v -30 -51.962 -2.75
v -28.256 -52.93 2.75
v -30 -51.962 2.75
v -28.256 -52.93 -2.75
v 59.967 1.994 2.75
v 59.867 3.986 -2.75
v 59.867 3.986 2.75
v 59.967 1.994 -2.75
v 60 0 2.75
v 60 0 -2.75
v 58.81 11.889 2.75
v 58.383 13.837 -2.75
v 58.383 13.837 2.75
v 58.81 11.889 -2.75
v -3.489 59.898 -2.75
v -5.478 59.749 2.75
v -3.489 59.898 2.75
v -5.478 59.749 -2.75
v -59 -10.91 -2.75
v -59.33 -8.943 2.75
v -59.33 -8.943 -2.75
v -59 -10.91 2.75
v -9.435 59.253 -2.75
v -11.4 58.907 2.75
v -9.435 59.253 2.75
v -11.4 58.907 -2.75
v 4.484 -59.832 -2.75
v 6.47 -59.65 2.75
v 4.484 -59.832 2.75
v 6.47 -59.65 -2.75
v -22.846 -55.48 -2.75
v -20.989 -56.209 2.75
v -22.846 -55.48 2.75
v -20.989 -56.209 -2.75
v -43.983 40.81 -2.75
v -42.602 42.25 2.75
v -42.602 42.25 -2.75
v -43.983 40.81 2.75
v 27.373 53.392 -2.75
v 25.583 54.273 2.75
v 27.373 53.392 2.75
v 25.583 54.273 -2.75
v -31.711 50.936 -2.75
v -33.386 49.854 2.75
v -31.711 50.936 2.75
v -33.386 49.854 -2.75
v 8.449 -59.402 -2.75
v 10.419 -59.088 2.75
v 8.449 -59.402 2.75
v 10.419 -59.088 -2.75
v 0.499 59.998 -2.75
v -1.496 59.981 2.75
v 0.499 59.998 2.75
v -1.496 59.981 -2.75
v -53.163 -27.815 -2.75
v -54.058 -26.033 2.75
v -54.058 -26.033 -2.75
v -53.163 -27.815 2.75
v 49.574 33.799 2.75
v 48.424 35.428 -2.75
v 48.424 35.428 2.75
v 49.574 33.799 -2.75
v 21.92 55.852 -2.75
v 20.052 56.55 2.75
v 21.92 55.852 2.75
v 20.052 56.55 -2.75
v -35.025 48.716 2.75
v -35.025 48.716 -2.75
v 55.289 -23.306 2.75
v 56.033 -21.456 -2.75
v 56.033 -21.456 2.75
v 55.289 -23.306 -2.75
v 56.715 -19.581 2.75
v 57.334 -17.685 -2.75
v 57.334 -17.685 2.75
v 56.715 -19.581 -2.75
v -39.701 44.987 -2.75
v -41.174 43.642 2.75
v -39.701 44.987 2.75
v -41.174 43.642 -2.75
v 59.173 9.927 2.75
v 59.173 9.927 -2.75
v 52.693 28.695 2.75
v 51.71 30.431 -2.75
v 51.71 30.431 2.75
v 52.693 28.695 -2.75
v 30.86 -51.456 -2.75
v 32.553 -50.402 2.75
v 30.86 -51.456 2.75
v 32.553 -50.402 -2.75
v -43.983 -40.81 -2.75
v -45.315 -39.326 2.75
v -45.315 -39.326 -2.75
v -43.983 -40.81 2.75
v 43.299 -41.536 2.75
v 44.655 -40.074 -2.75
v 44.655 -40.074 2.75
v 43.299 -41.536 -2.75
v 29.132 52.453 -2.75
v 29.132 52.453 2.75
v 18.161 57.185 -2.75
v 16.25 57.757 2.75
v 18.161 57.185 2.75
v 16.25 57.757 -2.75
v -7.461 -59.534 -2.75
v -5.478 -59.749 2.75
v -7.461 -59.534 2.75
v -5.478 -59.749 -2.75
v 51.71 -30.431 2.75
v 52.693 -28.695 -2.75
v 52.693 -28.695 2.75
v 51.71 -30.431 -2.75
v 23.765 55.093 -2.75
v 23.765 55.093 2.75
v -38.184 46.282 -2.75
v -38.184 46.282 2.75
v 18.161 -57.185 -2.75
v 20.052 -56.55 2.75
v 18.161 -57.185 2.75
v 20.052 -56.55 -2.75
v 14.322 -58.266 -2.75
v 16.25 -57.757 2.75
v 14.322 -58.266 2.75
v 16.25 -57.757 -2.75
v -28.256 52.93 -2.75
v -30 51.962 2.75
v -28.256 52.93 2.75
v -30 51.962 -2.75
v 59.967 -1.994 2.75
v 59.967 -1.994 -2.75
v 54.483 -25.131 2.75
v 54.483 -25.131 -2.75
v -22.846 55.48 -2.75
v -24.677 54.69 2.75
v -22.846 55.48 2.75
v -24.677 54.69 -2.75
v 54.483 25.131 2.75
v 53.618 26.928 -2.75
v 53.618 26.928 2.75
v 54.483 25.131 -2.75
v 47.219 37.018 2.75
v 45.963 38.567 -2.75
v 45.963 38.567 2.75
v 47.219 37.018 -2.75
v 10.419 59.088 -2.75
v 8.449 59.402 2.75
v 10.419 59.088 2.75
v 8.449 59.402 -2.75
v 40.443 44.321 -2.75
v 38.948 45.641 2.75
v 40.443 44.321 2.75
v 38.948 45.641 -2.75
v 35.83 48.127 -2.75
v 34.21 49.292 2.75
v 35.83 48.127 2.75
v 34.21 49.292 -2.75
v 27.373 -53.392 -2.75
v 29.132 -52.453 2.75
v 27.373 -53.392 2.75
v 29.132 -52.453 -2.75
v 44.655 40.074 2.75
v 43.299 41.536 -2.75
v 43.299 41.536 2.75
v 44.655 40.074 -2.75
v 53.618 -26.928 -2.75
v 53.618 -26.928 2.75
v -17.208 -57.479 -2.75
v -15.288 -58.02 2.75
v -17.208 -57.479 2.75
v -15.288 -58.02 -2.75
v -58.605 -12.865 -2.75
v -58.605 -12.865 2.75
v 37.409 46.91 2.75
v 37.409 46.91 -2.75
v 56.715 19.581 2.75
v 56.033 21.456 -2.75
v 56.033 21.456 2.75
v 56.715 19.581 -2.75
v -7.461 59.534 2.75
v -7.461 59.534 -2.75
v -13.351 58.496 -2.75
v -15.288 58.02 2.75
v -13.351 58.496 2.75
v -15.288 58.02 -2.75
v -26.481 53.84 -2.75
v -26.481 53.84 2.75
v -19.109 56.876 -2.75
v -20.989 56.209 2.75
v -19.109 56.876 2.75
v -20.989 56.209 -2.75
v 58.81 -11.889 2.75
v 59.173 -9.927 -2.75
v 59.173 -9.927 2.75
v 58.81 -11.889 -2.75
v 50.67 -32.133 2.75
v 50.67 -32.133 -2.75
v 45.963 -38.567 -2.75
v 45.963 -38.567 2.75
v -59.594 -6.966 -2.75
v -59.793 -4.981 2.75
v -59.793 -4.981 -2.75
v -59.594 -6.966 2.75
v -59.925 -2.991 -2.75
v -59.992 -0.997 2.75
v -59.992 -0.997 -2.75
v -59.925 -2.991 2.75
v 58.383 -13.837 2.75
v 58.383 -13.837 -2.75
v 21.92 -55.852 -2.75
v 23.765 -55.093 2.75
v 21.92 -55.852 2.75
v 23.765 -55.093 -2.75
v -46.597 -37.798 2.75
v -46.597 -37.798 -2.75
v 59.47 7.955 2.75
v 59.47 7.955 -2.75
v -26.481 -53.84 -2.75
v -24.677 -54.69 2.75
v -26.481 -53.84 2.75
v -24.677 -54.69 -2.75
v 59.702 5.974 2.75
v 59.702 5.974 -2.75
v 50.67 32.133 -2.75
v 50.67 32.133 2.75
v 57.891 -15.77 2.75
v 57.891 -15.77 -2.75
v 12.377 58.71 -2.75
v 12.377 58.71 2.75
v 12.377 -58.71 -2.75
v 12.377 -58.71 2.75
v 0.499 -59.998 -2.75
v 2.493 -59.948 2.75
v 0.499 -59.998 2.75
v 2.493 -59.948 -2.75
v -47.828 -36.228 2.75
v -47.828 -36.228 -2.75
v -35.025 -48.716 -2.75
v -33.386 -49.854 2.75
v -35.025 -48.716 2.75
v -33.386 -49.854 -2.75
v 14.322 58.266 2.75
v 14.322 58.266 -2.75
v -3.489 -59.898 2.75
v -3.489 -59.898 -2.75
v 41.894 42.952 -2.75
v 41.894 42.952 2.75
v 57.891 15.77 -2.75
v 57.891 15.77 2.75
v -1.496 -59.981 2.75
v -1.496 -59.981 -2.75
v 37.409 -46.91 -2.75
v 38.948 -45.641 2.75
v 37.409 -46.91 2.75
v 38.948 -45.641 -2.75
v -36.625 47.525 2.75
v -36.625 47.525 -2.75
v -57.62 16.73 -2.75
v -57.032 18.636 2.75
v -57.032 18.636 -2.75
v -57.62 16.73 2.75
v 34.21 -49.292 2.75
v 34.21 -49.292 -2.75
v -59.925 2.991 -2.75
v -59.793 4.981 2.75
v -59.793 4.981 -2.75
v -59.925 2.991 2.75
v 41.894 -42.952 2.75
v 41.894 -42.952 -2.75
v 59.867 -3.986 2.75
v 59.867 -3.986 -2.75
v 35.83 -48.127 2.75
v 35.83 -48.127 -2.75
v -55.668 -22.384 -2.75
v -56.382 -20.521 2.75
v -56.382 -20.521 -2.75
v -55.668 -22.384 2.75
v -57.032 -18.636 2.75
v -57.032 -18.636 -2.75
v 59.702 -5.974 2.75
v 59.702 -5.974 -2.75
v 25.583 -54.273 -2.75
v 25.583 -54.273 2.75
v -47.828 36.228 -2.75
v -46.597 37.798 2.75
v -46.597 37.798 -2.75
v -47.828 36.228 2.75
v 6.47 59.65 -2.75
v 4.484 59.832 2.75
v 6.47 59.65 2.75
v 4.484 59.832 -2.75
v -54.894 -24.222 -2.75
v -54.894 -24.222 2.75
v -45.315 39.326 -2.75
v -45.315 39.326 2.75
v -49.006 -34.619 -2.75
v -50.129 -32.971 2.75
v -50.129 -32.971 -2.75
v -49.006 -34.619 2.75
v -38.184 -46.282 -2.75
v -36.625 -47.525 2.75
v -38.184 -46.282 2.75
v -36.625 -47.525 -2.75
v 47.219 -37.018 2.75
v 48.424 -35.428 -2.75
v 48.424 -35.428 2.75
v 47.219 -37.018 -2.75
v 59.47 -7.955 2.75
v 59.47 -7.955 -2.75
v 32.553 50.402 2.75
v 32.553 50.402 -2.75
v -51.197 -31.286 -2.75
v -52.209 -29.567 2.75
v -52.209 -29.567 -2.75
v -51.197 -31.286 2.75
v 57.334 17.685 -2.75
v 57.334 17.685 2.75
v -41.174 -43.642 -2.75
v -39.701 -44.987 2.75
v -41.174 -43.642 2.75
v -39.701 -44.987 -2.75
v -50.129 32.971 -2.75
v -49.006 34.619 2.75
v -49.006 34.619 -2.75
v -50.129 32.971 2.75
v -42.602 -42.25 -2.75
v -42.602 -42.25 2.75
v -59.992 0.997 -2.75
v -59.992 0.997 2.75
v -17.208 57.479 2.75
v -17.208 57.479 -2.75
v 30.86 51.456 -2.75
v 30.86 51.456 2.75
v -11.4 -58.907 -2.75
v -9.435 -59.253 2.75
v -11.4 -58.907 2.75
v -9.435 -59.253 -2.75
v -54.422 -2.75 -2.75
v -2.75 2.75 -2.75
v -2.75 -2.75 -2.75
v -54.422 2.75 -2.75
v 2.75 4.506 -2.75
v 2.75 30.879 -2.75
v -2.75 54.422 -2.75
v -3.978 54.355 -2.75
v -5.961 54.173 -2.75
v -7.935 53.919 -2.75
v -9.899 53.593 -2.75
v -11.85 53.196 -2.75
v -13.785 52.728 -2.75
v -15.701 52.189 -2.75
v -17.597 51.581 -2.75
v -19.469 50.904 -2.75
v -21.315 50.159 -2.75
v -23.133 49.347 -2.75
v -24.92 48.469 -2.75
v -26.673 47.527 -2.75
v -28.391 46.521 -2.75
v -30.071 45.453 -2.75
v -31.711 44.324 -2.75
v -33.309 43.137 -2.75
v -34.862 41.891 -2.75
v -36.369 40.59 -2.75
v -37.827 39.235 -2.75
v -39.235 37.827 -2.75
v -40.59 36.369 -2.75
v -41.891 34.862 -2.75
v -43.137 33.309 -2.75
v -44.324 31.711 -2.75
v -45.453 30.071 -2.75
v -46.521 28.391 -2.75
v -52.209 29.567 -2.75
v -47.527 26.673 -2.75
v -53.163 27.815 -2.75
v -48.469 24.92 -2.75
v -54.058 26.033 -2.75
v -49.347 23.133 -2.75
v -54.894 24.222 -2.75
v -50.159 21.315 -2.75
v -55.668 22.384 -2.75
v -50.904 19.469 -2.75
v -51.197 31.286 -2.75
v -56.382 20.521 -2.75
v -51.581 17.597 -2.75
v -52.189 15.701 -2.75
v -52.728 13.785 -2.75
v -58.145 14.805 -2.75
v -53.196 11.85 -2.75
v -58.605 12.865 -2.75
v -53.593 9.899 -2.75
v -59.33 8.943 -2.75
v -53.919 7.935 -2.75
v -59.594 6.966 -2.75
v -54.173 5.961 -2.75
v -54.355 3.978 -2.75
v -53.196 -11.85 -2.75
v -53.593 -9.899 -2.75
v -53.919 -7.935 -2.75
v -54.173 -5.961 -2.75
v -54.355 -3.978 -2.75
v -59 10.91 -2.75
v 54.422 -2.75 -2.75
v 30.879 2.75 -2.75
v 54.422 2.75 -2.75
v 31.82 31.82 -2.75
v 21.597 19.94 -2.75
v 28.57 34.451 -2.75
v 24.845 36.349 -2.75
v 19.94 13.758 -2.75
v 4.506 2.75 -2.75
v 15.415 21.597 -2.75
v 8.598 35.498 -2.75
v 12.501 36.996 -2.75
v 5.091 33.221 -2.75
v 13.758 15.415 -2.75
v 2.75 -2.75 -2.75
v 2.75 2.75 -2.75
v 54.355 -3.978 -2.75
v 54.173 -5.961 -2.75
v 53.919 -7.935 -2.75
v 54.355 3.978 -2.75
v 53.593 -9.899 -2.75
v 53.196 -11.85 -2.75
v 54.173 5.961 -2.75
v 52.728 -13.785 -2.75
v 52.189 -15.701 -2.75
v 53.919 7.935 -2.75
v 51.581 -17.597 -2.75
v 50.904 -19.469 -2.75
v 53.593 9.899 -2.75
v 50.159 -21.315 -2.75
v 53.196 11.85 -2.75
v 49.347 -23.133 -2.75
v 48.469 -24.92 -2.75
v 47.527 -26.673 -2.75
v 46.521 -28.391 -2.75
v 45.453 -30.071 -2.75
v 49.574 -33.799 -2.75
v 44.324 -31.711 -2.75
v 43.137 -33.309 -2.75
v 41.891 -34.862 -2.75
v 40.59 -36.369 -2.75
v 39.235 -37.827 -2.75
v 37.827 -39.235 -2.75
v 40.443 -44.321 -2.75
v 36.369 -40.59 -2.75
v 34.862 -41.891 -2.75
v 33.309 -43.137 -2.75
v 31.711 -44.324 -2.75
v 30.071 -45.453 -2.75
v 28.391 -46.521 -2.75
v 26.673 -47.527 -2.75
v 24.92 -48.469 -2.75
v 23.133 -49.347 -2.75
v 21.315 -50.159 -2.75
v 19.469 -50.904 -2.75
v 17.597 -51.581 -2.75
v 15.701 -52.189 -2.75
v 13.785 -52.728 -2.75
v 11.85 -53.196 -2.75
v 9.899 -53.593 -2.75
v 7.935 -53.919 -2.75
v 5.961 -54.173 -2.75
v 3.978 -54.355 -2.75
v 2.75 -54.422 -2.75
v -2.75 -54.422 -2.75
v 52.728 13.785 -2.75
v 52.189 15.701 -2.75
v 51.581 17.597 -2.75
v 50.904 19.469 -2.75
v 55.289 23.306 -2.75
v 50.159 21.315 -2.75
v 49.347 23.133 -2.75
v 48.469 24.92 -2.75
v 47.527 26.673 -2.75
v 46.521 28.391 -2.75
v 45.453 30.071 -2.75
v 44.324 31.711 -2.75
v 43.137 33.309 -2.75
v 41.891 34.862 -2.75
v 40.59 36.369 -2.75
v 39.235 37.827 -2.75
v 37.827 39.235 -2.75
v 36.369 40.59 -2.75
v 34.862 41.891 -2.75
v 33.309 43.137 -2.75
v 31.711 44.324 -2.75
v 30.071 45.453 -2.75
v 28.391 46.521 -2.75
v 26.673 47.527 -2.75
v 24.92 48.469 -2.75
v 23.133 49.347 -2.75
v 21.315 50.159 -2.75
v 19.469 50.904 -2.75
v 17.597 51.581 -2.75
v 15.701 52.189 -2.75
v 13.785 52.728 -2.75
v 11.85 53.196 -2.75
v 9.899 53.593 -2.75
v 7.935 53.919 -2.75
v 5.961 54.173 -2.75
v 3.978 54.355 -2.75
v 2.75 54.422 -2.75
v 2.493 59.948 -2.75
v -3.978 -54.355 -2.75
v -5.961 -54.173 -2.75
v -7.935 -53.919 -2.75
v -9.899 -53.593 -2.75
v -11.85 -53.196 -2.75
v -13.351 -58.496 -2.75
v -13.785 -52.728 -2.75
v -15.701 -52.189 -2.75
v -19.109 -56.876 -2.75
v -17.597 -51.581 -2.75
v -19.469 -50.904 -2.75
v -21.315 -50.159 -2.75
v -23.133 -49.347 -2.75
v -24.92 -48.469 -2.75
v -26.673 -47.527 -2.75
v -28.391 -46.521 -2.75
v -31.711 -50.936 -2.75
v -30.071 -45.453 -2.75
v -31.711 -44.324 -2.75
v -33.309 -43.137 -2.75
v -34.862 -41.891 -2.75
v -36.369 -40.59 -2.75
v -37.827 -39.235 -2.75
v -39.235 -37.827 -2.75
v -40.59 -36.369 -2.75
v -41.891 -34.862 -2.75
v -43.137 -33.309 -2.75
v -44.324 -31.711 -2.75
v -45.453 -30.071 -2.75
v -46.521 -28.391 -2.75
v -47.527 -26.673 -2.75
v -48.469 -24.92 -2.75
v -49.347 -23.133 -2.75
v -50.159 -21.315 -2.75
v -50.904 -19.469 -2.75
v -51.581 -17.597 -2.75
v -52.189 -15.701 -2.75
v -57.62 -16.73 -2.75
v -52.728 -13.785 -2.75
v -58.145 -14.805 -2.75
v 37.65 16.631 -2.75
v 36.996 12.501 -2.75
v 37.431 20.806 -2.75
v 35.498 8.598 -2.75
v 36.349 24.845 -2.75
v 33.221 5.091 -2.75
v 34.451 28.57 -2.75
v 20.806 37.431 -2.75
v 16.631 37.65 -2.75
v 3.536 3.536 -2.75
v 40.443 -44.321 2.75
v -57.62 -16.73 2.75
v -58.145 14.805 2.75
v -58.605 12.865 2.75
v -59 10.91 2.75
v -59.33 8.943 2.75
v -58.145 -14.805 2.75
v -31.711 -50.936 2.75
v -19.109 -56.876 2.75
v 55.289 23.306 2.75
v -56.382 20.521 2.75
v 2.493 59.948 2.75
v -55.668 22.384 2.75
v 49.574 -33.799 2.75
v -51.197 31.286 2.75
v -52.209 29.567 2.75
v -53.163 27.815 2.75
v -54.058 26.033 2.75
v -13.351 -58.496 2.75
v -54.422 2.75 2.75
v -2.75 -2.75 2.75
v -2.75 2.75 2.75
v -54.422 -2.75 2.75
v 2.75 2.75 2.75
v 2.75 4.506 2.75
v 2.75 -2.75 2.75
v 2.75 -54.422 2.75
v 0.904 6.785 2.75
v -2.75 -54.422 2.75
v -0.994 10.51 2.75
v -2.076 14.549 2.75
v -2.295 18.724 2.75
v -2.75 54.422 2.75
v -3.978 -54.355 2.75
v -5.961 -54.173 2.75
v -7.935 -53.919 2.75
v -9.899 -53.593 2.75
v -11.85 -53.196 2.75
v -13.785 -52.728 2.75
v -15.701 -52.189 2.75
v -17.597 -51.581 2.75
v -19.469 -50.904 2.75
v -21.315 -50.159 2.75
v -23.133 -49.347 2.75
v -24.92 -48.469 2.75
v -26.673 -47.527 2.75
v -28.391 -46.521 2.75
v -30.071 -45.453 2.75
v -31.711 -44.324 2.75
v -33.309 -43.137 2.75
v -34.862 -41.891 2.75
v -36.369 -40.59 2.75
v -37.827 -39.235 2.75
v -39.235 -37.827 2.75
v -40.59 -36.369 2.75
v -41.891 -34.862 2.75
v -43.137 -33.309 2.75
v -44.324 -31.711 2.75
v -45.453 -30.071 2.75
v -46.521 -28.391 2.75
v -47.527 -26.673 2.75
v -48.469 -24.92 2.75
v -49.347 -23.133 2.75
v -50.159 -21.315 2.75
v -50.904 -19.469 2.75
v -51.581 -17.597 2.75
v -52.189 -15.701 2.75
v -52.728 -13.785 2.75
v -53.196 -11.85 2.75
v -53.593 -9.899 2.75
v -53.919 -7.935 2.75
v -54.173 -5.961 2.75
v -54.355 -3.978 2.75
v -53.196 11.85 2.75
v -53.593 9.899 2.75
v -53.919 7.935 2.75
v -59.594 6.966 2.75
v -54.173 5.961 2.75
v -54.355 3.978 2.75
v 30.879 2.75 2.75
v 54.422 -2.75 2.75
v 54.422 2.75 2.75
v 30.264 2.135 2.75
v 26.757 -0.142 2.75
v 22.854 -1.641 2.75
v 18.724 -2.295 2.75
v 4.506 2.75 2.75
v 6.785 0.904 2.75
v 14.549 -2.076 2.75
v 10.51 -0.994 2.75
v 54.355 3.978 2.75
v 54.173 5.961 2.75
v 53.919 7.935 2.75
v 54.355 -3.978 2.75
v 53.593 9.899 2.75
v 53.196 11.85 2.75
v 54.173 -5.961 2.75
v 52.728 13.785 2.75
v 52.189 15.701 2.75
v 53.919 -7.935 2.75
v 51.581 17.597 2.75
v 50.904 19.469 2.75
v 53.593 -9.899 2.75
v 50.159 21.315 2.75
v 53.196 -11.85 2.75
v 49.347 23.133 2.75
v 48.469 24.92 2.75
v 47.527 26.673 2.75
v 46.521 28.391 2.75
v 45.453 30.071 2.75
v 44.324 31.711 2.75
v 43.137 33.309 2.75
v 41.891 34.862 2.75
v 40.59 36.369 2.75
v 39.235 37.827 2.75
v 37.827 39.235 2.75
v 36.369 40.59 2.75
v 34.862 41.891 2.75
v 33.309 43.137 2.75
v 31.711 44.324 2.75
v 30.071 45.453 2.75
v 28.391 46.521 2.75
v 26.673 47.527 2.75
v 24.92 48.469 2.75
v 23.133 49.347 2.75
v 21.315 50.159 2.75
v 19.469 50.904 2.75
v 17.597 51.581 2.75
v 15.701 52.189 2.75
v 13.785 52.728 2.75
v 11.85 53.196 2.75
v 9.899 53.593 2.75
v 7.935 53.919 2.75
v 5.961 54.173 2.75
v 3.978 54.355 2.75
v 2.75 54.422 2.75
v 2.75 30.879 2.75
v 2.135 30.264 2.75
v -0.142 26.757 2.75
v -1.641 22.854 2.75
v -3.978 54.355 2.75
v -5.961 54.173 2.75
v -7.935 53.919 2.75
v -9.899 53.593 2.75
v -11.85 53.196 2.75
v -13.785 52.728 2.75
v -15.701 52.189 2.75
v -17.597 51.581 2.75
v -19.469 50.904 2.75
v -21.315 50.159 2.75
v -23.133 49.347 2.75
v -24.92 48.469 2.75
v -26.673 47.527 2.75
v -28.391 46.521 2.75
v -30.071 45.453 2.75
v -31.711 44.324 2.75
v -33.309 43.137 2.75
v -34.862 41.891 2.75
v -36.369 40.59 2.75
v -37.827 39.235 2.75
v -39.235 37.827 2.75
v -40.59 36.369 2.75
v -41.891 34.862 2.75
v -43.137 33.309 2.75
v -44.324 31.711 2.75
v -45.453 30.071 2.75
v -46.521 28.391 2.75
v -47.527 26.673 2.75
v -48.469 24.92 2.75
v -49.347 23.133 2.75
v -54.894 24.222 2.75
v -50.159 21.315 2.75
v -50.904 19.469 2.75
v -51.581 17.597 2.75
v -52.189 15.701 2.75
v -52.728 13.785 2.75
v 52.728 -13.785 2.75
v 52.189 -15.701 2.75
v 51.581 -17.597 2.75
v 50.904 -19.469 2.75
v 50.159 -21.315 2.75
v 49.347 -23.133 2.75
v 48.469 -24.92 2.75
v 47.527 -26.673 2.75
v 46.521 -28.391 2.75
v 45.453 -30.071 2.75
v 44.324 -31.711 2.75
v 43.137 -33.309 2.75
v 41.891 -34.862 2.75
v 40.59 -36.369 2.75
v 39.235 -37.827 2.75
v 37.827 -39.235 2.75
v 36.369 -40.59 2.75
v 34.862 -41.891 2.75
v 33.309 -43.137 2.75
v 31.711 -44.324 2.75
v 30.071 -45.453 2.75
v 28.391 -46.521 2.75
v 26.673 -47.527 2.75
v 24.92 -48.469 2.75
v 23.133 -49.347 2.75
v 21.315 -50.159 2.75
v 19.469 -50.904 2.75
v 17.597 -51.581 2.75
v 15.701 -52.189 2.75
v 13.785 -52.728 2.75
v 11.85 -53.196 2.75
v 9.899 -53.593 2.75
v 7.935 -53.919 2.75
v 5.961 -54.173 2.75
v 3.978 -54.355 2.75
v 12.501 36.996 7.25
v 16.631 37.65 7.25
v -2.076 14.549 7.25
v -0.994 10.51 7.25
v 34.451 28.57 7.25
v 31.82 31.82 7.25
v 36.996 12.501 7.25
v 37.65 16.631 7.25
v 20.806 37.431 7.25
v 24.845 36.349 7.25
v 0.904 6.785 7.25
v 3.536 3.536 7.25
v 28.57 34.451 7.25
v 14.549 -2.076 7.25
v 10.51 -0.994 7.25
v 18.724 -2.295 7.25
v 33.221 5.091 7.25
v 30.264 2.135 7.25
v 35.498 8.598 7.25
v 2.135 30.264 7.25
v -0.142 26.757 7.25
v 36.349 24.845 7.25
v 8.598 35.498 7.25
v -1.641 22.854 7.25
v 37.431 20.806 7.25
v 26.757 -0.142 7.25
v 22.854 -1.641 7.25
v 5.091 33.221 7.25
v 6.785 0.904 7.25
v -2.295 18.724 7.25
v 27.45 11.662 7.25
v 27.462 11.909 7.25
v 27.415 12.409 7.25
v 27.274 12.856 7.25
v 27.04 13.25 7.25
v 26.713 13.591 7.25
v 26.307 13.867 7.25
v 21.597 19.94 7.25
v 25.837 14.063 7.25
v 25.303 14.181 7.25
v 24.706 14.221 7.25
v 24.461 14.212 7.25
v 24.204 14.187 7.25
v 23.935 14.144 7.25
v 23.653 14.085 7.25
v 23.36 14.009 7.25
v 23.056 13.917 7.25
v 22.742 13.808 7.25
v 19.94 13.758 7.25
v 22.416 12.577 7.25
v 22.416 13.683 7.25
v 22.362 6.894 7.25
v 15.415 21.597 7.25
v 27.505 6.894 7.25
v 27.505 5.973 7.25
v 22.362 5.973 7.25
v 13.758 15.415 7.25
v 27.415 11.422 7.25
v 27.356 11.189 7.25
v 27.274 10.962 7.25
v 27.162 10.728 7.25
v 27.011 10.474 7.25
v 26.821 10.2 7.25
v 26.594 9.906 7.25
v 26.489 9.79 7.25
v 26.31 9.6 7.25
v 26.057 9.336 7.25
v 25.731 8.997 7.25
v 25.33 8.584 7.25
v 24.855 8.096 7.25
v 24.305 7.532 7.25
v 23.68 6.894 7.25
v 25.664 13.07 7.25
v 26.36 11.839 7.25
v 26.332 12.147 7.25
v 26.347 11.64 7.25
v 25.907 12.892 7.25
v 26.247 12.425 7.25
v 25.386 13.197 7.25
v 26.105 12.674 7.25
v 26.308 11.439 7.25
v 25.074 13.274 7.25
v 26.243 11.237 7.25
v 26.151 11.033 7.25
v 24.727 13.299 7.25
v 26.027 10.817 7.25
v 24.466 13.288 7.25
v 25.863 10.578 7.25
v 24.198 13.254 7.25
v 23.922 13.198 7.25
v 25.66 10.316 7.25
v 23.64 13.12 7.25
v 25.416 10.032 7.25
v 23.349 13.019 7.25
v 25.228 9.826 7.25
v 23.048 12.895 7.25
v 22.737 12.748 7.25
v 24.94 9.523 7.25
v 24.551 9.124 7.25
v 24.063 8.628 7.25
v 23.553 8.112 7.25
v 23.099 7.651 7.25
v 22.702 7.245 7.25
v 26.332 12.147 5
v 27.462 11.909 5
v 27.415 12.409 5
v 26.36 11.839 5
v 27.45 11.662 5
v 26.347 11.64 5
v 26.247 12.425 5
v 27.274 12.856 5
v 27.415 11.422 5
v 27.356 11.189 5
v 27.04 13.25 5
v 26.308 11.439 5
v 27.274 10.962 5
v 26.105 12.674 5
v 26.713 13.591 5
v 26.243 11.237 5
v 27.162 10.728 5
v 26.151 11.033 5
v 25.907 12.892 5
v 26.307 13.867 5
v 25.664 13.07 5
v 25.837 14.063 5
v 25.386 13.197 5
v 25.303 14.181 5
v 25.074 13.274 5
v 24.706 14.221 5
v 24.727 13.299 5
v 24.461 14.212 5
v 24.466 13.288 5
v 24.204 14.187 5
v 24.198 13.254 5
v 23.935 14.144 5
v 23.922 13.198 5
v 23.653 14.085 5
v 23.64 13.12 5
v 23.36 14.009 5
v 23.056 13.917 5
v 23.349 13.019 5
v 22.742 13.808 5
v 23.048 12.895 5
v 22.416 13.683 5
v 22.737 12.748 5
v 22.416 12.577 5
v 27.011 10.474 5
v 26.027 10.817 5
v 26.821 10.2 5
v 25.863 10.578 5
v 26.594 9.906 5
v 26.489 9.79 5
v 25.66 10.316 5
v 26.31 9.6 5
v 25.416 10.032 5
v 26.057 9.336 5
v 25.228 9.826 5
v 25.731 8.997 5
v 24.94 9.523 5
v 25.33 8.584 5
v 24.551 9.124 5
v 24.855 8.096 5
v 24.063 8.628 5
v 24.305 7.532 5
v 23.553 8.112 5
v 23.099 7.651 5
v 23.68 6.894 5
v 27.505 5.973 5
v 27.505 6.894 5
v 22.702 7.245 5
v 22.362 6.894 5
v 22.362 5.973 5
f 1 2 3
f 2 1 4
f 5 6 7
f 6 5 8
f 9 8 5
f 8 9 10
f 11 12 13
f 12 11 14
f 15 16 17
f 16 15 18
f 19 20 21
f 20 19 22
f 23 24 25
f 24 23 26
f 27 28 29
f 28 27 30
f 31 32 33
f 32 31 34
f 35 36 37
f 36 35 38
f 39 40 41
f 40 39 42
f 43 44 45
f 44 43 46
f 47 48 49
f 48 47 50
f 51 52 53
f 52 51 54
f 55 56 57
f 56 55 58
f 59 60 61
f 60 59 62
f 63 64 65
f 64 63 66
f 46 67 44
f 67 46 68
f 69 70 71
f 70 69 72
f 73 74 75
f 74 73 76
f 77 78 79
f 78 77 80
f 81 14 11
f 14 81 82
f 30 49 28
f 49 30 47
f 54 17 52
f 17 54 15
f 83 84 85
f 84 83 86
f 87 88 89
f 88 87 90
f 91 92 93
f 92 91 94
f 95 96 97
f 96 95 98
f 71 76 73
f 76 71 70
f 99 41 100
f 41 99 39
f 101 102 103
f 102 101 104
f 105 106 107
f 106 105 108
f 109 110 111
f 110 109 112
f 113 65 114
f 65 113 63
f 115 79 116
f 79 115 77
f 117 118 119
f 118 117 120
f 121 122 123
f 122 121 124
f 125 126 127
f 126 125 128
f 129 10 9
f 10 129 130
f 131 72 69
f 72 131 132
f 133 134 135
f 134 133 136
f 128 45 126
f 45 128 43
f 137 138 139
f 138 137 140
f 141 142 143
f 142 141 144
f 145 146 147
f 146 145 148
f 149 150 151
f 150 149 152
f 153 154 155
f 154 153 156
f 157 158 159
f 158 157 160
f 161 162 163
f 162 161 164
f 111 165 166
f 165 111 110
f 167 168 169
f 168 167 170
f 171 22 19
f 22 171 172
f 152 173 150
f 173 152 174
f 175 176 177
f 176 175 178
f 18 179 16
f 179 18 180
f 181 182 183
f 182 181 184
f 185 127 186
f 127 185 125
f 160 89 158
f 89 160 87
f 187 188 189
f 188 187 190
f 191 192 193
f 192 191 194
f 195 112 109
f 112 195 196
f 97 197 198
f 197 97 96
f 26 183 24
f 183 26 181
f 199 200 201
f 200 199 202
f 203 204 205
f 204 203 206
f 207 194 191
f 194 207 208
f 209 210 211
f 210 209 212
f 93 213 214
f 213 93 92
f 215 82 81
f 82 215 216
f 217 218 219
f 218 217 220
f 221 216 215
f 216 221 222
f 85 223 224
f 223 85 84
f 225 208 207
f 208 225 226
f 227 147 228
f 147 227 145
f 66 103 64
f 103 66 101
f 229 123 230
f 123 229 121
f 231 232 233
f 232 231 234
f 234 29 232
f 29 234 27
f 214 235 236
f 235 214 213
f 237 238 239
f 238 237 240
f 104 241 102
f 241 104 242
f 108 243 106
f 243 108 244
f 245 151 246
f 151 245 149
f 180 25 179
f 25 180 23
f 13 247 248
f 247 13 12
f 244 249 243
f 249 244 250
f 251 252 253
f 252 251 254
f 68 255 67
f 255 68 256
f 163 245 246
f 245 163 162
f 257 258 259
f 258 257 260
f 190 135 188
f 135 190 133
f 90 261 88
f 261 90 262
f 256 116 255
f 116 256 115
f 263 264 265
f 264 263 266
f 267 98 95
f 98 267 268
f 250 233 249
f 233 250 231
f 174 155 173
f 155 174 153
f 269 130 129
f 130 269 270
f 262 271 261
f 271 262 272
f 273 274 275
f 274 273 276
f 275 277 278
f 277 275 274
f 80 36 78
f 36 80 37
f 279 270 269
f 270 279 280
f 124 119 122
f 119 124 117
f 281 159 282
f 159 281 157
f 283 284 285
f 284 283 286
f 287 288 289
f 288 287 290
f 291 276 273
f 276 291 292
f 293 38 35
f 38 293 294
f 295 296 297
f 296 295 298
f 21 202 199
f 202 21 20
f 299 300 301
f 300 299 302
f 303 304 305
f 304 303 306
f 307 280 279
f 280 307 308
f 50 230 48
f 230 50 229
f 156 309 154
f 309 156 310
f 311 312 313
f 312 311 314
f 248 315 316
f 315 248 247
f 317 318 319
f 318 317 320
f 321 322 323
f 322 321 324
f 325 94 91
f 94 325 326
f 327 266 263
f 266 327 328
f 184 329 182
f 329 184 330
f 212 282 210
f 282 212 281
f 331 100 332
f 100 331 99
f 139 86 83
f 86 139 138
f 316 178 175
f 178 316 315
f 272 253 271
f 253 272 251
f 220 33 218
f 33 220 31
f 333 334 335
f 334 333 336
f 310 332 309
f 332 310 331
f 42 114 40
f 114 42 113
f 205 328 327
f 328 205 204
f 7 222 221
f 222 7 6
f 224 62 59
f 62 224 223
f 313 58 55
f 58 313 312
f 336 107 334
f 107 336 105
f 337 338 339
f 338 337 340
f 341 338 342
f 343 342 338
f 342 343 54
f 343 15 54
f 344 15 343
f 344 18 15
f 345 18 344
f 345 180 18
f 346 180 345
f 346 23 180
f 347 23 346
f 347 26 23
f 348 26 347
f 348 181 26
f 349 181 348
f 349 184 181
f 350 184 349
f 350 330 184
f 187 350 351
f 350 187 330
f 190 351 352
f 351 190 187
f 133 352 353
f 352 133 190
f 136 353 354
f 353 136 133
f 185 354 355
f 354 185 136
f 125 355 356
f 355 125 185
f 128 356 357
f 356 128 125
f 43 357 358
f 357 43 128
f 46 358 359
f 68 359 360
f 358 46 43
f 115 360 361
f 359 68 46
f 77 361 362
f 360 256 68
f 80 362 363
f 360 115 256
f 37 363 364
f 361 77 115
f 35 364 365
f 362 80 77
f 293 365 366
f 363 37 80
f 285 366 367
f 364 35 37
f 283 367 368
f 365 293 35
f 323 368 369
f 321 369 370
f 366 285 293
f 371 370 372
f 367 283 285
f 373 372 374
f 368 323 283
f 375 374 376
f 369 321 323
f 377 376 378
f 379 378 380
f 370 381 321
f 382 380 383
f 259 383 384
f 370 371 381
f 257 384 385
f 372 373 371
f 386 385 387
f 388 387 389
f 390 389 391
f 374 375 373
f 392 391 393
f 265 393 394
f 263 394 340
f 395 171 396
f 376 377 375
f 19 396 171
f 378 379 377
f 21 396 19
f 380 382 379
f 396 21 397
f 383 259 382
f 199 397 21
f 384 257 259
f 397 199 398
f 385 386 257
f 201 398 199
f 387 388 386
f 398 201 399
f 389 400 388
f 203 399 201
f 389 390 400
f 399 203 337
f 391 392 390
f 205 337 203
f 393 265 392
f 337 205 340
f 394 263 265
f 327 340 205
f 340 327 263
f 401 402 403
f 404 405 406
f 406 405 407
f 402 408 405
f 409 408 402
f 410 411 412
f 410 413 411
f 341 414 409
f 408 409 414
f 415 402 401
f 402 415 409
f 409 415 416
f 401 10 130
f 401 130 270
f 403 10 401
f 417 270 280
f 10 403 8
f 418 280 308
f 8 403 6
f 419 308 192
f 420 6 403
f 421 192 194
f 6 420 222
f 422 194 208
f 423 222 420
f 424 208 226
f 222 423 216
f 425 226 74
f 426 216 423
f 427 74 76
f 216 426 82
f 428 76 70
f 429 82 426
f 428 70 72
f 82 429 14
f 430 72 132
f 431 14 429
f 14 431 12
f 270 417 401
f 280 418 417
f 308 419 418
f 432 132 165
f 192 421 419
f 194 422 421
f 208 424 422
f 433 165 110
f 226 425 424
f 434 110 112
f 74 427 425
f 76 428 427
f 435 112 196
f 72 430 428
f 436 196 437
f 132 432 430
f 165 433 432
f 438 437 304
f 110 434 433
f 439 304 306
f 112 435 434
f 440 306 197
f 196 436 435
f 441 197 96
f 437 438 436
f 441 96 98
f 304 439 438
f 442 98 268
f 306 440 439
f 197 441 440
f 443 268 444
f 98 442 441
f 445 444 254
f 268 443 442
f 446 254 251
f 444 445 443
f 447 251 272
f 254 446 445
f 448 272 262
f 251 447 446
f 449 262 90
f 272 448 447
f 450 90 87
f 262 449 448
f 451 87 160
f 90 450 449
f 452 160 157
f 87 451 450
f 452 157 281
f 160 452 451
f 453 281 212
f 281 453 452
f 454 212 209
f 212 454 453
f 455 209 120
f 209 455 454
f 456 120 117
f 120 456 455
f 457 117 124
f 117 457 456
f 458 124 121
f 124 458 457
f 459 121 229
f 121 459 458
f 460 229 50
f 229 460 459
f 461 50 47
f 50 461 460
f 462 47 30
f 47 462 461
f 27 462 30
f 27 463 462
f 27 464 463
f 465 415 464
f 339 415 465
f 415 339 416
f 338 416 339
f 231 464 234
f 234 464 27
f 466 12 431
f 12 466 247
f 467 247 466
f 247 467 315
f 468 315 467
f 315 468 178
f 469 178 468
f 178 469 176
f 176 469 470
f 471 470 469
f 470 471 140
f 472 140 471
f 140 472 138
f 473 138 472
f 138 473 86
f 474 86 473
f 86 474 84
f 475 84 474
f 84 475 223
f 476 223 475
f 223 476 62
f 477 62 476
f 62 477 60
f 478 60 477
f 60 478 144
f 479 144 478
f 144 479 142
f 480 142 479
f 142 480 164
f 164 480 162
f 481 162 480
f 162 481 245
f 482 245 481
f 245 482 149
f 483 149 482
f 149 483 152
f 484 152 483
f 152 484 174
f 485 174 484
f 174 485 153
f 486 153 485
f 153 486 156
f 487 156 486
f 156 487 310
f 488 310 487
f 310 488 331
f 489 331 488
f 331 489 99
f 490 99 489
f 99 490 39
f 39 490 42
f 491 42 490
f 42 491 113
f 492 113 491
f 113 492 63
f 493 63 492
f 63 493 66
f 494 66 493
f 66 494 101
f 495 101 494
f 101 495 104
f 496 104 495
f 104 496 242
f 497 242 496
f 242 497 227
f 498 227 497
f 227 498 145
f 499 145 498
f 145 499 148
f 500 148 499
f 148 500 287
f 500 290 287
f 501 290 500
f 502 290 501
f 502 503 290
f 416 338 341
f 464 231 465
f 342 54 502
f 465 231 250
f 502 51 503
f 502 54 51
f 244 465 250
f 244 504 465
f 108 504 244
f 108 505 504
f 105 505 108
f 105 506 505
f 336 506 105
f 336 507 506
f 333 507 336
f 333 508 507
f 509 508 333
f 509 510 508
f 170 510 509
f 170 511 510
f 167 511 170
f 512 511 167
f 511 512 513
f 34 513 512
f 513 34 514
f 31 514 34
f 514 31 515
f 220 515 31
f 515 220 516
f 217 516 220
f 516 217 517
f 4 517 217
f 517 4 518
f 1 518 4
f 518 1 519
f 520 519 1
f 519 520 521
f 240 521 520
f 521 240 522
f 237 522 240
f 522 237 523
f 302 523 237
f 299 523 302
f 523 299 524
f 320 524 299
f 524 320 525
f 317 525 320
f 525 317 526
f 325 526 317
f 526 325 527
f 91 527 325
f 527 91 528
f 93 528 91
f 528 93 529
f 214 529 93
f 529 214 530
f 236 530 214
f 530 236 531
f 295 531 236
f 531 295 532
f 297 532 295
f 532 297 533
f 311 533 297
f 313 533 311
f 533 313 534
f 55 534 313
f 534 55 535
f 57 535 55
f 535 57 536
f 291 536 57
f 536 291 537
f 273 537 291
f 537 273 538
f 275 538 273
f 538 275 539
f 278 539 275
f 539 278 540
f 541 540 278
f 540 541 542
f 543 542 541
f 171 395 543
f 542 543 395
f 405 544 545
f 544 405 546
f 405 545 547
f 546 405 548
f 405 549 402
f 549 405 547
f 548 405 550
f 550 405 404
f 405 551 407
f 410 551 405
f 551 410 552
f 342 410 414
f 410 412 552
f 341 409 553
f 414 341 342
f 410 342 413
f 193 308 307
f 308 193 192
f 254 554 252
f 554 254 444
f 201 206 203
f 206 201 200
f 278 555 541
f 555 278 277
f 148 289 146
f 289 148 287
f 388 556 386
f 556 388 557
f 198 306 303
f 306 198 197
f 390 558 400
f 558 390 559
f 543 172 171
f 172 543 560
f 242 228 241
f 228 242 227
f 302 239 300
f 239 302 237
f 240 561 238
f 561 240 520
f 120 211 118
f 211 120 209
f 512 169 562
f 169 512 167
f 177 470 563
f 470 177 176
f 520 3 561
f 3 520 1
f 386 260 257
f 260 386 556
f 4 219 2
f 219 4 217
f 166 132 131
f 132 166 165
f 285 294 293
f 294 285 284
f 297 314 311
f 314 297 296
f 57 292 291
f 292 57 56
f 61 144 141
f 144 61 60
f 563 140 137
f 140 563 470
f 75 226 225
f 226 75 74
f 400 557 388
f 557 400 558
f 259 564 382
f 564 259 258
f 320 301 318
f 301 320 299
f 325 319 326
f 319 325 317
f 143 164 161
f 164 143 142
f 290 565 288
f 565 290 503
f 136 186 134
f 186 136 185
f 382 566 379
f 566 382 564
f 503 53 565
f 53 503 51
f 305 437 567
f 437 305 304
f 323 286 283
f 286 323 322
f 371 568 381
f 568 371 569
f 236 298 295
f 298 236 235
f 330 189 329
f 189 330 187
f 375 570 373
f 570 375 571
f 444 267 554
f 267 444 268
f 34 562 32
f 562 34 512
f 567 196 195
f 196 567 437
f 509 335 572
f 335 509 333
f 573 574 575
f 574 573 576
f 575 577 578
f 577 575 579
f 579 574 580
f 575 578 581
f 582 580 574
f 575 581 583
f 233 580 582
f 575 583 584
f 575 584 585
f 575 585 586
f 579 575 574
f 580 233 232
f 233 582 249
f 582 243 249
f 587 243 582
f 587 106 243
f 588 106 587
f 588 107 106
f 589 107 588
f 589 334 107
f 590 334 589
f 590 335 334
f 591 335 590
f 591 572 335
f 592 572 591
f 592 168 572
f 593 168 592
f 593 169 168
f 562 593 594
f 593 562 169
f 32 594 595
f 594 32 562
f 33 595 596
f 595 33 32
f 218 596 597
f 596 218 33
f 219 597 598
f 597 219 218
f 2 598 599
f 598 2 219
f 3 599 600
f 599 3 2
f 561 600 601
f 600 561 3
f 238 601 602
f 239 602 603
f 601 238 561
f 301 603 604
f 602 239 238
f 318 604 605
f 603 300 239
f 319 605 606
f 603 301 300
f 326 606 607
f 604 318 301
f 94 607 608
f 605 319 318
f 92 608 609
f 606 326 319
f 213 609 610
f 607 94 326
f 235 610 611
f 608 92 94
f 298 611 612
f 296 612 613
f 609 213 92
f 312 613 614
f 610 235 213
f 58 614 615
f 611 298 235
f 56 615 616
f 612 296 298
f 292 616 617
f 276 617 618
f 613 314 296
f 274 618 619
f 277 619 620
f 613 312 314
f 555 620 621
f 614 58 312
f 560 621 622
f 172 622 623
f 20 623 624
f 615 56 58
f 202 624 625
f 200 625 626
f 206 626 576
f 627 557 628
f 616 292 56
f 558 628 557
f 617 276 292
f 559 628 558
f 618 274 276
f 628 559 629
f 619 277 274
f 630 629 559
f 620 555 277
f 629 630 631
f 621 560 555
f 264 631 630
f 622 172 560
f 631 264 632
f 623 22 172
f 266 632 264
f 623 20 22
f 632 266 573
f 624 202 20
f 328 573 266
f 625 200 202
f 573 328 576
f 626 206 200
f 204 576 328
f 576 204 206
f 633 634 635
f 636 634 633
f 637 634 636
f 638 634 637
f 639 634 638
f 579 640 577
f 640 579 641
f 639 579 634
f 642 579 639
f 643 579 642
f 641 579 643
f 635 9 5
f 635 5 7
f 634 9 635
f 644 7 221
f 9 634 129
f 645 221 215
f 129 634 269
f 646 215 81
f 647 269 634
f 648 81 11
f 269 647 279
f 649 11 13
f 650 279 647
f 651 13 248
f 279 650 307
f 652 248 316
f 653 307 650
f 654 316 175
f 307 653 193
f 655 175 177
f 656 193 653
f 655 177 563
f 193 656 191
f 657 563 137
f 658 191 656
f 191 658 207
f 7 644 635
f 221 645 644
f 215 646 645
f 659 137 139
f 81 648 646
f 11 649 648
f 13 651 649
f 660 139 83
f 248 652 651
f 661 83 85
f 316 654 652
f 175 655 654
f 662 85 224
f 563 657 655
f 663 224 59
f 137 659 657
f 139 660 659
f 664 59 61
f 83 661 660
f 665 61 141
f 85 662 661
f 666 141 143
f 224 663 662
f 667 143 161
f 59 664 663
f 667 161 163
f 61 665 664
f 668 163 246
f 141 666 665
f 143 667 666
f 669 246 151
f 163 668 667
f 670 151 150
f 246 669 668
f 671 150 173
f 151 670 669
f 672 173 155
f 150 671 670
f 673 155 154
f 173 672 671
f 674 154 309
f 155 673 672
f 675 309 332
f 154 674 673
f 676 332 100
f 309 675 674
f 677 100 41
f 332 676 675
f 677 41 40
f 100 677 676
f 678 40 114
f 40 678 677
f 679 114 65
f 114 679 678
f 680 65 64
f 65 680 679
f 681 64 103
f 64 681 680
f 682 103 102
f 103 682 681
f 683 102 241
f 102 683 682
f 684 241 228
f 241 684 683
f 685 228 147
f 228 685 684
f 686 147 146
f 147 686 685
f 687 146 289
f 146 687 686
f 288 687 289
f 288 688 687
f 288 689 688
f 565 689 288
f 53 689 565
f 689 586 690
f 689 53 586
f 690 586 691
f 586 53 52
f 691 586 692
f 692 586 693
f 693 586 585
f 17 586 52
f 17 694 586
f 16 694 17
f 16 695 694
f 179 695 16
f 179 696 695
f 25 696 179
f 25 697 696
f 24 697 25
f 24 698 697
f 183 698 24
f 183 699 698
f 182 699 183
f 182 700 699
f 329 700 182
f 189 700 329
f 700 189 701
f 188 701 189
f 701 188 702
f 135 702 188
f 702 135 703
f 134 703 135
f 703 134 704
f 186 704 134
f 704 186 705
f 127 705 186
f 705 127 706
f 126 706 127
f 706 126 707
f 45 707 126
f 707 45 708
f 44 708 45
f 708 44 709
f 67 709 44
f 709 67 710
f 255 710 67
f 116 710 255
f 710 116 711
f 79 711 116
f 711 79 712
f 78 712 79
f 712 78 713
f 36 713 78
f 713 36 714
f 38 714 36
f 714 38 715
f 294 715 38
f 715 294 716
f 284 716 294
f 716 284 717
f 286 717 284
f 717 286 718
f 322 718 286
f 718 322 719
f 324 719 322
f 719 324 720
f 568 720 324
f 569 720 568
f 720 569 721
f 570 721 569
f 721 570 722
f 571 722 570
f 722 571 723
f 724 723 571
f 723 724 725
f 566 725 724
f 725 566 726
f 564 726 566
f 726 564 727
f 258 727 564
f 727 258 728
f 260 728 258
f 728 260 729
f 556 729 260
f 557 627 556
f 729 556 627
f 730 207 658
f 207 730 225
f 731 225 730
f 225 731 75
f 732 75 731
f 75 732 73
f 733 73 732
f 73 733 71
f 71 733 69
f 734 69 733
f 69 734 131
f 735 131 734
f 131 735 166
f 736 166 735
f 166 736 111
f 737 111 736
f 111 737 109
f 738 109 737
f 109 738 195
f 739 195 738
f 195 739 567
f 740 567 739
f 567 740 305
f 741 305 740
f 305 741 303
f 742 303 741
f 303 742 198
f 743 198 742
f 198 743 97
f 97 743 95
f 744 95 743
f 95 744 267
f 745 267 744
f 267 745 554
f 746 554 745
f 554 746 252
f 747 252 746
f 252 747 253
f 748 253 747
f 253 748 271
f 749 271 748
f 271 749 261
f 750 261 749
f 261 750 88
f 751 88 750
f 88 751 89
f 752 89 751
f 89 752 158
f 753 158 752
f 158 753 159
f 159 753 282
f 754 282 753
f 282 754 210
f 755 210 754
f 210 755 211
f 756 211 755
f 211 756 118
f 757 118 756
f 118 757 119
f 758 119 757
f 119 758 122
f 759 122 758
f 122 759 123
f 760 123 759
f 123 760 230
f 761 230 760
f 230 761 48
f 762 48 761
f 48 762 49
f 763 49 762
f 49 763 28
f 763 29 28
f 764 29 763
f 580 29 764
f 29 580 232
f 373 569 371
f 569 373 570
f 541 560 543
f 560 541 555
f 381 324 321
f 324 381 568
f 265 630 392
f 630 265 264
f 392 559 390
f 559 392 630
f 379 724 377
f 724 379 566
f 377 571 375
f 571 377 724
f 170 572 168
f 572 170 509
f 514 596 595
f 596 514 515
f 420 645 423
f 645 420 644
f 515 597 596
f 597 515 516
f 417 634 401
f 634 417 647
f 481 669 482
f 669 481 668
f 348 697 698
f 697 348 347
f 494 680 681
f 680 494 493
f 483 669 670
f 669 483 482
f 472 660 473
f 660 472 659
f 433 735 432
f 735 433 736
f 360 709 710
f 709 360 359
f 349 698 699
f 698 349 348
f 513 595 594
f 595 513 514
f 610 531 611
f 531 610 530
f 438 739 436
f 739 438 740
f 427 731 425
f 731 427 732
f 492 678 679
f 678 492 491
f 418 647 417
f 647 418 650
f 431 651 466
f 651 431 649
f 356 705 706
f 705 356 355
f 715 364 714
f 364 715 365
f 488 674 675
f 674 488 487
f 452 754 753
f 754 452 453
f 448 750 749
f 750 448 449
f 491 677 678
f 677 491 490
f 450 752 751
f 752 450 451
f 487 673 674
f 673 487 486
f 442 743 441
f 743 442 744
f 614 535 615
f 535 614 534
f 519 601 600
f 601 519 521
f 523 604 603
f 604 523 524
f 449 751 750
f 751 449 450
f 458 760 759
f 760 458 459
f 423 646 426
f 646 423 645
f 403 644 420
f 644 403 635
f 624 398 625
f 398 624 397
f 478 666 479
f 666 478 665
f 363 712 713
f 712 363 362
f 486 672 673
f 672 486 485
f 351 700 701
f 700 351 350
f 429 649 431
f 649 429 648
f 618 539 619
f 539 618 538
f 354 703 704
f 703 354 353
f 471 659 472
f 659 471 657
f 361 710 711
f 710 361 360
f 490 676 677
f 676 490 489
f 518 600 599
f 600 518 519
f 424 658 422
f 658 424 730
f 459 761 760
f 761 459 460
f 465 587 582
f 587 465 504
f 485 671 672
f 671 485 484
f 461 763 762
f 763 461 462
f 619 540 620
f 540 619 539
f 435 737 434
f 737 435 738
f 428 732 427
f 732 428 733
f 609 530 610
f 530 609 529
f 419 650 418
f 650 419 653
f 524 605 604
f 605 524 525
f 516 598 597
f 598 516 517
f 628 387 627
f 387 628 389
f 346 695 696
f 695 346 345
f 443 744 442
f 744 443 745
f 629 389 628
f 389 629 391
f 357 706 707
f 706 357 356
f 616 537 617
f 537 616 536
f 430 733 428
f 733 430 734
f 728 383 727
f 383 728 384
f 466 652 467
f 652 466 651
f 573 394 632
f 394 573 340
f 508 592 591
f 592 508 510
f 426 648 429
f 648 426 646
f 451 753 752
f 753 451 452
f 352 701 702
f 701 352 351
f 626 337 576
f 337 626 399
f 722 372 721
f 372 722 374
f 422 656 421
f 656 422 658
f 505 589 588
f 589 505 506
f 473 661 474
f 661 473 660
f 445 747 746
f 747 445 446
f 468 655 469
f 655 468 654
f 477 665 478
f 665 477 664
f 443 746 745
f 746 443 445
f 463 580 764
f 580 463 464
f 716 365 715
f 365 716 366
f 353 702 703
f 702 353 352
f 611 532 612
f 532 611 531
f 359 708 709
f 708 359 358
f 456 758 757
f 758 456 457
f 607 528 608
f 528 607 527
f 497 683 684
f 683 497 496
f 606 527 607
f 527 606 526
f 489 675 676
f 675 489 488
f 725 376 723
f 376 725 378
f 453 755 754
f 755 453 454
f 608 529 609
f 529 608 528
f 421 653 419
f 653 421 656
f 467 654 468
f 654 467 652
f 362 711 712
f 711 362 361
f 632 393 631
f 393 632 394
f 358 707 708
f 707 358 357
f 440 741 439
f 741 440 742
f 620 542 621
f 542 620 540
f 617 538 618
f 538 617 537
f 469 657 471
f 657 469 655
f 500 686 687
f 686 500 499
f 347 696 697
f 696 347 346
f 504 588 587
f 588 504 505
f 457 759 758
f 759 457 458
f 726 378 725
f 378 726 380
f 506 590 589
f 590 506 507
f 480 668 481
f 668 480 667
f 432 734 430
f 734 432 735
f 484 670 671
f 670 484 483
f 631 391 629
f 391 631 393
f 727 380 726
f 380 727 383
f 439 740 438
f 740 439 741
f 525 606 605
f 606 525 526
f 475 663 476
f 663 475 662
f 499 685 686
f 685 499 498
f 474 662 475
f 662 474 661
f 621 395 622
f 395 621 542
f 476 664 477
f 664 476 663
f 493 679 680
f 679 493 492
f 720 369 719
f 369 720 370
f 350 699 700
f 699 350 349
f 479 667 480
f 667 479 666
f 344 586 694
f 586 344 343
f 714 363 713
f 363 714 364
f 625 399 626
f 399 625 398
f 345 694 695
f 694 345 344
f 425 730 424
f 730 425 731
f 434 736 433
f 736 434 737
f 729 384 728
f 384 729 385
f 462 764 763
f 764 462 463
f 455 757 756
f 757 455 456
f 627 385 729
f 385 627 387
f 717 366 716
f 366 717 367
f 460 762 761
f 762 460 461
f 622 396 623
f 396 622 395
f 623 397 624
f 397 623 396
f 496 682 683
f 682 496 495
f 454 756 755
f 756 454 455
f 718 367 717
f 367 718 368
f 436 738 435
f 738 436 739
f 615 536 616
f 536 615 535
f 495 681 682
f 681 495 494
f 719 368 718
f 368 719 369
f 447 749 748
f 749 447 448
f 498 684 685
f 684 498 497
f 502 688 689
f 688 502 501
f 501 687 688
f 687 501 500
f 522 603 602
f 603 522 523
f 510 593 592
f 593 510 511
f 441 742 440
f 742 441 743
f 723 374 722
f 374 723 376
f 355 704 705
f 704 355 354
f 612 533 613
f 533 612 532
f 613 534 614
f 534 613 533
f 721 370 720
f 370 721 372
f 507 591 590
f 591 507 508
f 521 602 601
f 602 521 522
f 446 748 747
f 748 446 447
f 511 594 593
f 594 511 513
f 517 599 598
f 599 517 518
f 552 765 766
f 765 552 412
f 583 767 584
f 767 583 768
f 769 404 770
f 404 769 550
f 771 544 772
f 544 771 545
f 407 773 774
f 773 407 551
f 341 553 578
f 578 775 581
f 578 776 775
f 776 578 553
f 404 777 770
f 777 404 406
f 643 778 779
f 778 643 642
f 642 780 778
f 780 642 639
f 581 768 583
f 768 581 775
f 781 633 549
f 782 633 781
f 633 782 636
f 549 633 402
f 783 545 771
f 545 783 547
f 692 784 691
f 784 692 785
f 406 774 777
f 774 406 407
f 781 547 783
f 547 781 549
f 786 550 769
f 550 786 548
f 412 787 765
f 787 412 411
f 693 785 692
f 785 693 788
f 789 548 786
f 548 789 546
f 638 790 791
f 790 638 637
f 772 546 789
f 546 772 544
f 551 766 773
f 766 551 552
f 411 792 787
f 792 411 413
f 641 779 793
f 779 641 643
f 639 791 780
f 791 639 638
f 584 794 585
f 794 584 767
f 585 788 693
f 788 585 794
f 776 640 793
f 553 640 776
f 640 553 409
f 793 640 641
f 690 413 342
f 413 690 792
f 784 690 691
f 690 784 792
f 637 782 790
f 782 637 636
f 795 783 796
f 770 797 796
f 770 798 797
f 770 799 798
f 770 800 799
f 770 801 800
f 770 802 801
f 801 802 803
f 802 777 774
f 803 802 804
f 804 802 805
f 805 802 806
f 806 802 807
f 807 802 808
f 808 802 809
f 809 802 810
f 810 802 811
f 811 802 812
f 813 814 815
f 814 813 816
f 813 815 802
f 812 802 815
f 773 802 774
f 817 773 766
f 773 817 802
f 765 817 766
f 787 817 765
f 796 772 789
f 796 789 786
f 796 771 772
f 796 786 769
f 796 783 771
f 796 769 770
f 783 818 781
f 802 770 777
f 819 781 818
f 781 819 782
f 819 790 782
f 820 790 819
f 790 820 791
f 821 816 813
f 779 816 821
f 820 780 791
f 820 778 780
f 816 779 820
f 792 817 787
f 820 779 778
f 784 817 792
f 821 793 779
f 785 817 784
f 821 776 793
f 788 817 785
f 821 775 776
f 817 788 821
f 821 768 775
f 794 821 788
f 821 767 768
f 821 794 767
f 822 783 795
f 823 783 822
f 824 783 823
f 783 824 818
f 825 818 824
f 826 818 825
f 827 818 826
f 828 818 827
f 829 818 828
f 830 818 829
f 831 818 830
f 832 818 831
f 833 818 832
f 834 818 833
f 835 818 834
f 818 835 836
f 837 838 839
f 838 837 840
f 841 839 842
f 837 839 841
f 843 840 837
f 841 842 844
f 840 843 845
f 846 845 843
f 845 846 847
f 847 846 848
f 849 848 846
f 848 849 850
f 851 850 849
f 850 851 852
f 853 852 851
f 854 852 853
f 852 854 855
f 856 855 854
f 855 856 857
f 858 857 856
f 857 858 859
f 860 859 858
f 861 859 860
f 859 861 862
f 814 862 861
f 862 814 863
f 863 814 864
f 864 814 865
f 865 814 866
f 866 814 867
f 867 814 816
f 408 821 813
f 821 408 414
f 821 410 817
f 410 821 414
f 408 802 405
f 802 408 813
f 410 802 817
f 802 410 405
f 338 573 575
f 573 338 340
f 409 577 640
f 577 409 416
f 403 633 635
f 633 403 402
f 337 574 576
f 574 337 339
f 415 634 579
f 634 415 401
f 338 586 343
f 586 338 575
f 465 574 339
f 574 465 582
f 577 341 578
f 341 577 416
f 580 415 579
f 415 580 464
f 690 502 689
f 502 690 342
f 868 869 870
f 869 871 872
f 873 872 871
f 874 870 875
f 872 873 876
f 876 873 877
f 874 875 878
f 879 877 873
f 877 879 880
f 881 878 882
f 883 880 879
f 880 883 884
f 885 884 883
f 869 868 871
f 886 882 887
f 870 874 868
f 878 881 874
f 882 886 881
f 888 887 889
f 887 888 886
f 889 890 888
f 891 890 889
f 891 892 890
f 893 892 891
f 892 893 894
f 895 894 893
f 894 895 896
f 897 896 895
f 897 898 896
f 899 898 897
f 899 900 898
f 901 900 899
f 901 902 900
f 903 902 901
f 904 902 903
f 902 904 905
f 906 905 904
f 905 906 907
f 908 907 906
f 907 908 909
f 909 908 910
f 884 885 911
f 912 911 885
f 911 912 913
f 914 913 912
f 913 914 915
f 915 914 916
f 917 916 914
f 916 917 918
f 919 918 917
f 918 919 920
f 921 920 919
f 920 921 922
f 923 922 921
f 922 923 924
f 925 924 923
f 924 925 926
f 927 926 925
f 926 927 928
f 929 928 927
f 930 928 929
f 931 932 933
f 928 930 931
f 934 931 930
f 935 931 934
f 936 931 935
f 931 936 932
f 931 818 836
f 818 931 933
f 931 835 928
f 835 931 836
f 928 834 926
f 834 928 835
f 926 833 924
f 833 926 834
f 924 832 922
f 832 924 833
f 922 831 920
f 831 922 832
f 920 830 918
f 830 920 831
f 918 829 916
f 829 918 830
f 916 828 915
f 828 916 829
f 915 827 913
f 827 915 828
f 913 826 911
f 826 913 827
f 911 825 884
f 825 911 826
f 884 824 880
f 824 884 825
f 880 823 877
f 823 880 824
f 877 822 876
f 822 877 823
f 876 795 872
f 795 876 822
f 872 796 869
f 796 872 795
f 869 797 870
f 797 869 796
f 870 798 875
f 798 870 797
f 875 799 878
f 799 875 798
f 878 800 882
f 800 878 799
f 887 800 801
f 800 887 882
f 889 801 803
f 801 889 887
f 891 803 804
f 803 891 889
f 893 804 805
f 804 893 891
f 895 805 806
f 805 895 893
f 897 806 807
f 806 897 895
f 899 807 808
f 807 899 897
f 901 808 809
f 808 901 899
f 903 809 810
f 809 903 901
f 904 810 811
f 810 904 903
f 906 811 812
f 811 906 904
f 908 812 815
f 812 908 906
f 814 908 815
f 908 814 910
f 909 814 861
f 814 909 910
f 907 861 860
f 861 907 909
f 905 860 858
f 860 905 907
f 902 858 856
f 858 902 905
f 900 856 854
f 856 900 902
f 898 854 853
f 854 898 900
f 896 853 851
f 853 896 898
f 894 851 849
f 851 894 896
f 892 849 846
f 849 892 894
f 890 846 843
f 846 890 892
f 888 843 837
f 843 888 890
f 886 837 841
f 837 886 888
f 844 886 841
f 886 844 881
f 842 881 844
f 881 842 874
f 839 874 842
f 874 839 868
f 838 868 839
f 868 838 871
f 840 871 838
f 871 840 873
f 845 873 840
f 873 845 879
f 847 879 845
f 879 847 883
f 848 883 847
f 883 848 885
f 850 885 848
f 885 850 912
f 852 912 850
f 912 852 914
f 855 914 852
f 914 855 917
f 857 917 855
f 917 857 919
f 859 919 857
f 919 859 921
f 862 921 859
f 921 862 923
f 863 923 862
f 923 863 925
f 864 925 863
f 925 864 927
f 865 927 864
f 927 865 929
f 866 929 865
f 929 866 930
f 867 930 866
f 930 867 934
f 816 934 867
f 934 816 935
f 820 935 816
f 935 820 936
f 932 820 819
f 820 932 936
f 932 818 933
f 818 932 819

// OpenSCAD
outerdiameter=120;
ringwidth=5.5;
height=5.5;
holerotation = 15;
//index=0;
//index=1;
index=2;
//index=3;
//index=4;
//index=5;

module axelpart()
{
    translate([25,0,2.25]) {
        difference(){
            cylinder(h=10, r=20, center=true);
            //union(){
            //cube([6.4,6.4,100],true);
            rotate(a=holerotation*index,v=[0,0,1]){
                cube([6.4,6.4,100],true);
            }
           // }
        }
    }
}

module ring() {
    $fa =0.1;
    color("Lime") 
    difference() {
        cylinder(h=height, r=outerdiameter/2, center=true);
        cylinder(r=(outerdiameter/2)-ringwidth,h=height+2,center=true) ;  
    }
}
difference(){
union(){
    ring();
    spoke();
    rotate(a=90, v=[0,0,1]) {spoke(); }
    rotate(a=45, v=[0,0,1]){
        axelpart();
    }
}

 translate([25,10,5]) {
color("Lime")
linear_extrude(height=5, convexity=4)
                text("2", 
                     size=8,
                     font="Bitstream Vera Sans",
                     halign="center",
                     valign="center");
 }

}

module spoke()
{
     cube([outerdiameter-5,height,height],true);
}
